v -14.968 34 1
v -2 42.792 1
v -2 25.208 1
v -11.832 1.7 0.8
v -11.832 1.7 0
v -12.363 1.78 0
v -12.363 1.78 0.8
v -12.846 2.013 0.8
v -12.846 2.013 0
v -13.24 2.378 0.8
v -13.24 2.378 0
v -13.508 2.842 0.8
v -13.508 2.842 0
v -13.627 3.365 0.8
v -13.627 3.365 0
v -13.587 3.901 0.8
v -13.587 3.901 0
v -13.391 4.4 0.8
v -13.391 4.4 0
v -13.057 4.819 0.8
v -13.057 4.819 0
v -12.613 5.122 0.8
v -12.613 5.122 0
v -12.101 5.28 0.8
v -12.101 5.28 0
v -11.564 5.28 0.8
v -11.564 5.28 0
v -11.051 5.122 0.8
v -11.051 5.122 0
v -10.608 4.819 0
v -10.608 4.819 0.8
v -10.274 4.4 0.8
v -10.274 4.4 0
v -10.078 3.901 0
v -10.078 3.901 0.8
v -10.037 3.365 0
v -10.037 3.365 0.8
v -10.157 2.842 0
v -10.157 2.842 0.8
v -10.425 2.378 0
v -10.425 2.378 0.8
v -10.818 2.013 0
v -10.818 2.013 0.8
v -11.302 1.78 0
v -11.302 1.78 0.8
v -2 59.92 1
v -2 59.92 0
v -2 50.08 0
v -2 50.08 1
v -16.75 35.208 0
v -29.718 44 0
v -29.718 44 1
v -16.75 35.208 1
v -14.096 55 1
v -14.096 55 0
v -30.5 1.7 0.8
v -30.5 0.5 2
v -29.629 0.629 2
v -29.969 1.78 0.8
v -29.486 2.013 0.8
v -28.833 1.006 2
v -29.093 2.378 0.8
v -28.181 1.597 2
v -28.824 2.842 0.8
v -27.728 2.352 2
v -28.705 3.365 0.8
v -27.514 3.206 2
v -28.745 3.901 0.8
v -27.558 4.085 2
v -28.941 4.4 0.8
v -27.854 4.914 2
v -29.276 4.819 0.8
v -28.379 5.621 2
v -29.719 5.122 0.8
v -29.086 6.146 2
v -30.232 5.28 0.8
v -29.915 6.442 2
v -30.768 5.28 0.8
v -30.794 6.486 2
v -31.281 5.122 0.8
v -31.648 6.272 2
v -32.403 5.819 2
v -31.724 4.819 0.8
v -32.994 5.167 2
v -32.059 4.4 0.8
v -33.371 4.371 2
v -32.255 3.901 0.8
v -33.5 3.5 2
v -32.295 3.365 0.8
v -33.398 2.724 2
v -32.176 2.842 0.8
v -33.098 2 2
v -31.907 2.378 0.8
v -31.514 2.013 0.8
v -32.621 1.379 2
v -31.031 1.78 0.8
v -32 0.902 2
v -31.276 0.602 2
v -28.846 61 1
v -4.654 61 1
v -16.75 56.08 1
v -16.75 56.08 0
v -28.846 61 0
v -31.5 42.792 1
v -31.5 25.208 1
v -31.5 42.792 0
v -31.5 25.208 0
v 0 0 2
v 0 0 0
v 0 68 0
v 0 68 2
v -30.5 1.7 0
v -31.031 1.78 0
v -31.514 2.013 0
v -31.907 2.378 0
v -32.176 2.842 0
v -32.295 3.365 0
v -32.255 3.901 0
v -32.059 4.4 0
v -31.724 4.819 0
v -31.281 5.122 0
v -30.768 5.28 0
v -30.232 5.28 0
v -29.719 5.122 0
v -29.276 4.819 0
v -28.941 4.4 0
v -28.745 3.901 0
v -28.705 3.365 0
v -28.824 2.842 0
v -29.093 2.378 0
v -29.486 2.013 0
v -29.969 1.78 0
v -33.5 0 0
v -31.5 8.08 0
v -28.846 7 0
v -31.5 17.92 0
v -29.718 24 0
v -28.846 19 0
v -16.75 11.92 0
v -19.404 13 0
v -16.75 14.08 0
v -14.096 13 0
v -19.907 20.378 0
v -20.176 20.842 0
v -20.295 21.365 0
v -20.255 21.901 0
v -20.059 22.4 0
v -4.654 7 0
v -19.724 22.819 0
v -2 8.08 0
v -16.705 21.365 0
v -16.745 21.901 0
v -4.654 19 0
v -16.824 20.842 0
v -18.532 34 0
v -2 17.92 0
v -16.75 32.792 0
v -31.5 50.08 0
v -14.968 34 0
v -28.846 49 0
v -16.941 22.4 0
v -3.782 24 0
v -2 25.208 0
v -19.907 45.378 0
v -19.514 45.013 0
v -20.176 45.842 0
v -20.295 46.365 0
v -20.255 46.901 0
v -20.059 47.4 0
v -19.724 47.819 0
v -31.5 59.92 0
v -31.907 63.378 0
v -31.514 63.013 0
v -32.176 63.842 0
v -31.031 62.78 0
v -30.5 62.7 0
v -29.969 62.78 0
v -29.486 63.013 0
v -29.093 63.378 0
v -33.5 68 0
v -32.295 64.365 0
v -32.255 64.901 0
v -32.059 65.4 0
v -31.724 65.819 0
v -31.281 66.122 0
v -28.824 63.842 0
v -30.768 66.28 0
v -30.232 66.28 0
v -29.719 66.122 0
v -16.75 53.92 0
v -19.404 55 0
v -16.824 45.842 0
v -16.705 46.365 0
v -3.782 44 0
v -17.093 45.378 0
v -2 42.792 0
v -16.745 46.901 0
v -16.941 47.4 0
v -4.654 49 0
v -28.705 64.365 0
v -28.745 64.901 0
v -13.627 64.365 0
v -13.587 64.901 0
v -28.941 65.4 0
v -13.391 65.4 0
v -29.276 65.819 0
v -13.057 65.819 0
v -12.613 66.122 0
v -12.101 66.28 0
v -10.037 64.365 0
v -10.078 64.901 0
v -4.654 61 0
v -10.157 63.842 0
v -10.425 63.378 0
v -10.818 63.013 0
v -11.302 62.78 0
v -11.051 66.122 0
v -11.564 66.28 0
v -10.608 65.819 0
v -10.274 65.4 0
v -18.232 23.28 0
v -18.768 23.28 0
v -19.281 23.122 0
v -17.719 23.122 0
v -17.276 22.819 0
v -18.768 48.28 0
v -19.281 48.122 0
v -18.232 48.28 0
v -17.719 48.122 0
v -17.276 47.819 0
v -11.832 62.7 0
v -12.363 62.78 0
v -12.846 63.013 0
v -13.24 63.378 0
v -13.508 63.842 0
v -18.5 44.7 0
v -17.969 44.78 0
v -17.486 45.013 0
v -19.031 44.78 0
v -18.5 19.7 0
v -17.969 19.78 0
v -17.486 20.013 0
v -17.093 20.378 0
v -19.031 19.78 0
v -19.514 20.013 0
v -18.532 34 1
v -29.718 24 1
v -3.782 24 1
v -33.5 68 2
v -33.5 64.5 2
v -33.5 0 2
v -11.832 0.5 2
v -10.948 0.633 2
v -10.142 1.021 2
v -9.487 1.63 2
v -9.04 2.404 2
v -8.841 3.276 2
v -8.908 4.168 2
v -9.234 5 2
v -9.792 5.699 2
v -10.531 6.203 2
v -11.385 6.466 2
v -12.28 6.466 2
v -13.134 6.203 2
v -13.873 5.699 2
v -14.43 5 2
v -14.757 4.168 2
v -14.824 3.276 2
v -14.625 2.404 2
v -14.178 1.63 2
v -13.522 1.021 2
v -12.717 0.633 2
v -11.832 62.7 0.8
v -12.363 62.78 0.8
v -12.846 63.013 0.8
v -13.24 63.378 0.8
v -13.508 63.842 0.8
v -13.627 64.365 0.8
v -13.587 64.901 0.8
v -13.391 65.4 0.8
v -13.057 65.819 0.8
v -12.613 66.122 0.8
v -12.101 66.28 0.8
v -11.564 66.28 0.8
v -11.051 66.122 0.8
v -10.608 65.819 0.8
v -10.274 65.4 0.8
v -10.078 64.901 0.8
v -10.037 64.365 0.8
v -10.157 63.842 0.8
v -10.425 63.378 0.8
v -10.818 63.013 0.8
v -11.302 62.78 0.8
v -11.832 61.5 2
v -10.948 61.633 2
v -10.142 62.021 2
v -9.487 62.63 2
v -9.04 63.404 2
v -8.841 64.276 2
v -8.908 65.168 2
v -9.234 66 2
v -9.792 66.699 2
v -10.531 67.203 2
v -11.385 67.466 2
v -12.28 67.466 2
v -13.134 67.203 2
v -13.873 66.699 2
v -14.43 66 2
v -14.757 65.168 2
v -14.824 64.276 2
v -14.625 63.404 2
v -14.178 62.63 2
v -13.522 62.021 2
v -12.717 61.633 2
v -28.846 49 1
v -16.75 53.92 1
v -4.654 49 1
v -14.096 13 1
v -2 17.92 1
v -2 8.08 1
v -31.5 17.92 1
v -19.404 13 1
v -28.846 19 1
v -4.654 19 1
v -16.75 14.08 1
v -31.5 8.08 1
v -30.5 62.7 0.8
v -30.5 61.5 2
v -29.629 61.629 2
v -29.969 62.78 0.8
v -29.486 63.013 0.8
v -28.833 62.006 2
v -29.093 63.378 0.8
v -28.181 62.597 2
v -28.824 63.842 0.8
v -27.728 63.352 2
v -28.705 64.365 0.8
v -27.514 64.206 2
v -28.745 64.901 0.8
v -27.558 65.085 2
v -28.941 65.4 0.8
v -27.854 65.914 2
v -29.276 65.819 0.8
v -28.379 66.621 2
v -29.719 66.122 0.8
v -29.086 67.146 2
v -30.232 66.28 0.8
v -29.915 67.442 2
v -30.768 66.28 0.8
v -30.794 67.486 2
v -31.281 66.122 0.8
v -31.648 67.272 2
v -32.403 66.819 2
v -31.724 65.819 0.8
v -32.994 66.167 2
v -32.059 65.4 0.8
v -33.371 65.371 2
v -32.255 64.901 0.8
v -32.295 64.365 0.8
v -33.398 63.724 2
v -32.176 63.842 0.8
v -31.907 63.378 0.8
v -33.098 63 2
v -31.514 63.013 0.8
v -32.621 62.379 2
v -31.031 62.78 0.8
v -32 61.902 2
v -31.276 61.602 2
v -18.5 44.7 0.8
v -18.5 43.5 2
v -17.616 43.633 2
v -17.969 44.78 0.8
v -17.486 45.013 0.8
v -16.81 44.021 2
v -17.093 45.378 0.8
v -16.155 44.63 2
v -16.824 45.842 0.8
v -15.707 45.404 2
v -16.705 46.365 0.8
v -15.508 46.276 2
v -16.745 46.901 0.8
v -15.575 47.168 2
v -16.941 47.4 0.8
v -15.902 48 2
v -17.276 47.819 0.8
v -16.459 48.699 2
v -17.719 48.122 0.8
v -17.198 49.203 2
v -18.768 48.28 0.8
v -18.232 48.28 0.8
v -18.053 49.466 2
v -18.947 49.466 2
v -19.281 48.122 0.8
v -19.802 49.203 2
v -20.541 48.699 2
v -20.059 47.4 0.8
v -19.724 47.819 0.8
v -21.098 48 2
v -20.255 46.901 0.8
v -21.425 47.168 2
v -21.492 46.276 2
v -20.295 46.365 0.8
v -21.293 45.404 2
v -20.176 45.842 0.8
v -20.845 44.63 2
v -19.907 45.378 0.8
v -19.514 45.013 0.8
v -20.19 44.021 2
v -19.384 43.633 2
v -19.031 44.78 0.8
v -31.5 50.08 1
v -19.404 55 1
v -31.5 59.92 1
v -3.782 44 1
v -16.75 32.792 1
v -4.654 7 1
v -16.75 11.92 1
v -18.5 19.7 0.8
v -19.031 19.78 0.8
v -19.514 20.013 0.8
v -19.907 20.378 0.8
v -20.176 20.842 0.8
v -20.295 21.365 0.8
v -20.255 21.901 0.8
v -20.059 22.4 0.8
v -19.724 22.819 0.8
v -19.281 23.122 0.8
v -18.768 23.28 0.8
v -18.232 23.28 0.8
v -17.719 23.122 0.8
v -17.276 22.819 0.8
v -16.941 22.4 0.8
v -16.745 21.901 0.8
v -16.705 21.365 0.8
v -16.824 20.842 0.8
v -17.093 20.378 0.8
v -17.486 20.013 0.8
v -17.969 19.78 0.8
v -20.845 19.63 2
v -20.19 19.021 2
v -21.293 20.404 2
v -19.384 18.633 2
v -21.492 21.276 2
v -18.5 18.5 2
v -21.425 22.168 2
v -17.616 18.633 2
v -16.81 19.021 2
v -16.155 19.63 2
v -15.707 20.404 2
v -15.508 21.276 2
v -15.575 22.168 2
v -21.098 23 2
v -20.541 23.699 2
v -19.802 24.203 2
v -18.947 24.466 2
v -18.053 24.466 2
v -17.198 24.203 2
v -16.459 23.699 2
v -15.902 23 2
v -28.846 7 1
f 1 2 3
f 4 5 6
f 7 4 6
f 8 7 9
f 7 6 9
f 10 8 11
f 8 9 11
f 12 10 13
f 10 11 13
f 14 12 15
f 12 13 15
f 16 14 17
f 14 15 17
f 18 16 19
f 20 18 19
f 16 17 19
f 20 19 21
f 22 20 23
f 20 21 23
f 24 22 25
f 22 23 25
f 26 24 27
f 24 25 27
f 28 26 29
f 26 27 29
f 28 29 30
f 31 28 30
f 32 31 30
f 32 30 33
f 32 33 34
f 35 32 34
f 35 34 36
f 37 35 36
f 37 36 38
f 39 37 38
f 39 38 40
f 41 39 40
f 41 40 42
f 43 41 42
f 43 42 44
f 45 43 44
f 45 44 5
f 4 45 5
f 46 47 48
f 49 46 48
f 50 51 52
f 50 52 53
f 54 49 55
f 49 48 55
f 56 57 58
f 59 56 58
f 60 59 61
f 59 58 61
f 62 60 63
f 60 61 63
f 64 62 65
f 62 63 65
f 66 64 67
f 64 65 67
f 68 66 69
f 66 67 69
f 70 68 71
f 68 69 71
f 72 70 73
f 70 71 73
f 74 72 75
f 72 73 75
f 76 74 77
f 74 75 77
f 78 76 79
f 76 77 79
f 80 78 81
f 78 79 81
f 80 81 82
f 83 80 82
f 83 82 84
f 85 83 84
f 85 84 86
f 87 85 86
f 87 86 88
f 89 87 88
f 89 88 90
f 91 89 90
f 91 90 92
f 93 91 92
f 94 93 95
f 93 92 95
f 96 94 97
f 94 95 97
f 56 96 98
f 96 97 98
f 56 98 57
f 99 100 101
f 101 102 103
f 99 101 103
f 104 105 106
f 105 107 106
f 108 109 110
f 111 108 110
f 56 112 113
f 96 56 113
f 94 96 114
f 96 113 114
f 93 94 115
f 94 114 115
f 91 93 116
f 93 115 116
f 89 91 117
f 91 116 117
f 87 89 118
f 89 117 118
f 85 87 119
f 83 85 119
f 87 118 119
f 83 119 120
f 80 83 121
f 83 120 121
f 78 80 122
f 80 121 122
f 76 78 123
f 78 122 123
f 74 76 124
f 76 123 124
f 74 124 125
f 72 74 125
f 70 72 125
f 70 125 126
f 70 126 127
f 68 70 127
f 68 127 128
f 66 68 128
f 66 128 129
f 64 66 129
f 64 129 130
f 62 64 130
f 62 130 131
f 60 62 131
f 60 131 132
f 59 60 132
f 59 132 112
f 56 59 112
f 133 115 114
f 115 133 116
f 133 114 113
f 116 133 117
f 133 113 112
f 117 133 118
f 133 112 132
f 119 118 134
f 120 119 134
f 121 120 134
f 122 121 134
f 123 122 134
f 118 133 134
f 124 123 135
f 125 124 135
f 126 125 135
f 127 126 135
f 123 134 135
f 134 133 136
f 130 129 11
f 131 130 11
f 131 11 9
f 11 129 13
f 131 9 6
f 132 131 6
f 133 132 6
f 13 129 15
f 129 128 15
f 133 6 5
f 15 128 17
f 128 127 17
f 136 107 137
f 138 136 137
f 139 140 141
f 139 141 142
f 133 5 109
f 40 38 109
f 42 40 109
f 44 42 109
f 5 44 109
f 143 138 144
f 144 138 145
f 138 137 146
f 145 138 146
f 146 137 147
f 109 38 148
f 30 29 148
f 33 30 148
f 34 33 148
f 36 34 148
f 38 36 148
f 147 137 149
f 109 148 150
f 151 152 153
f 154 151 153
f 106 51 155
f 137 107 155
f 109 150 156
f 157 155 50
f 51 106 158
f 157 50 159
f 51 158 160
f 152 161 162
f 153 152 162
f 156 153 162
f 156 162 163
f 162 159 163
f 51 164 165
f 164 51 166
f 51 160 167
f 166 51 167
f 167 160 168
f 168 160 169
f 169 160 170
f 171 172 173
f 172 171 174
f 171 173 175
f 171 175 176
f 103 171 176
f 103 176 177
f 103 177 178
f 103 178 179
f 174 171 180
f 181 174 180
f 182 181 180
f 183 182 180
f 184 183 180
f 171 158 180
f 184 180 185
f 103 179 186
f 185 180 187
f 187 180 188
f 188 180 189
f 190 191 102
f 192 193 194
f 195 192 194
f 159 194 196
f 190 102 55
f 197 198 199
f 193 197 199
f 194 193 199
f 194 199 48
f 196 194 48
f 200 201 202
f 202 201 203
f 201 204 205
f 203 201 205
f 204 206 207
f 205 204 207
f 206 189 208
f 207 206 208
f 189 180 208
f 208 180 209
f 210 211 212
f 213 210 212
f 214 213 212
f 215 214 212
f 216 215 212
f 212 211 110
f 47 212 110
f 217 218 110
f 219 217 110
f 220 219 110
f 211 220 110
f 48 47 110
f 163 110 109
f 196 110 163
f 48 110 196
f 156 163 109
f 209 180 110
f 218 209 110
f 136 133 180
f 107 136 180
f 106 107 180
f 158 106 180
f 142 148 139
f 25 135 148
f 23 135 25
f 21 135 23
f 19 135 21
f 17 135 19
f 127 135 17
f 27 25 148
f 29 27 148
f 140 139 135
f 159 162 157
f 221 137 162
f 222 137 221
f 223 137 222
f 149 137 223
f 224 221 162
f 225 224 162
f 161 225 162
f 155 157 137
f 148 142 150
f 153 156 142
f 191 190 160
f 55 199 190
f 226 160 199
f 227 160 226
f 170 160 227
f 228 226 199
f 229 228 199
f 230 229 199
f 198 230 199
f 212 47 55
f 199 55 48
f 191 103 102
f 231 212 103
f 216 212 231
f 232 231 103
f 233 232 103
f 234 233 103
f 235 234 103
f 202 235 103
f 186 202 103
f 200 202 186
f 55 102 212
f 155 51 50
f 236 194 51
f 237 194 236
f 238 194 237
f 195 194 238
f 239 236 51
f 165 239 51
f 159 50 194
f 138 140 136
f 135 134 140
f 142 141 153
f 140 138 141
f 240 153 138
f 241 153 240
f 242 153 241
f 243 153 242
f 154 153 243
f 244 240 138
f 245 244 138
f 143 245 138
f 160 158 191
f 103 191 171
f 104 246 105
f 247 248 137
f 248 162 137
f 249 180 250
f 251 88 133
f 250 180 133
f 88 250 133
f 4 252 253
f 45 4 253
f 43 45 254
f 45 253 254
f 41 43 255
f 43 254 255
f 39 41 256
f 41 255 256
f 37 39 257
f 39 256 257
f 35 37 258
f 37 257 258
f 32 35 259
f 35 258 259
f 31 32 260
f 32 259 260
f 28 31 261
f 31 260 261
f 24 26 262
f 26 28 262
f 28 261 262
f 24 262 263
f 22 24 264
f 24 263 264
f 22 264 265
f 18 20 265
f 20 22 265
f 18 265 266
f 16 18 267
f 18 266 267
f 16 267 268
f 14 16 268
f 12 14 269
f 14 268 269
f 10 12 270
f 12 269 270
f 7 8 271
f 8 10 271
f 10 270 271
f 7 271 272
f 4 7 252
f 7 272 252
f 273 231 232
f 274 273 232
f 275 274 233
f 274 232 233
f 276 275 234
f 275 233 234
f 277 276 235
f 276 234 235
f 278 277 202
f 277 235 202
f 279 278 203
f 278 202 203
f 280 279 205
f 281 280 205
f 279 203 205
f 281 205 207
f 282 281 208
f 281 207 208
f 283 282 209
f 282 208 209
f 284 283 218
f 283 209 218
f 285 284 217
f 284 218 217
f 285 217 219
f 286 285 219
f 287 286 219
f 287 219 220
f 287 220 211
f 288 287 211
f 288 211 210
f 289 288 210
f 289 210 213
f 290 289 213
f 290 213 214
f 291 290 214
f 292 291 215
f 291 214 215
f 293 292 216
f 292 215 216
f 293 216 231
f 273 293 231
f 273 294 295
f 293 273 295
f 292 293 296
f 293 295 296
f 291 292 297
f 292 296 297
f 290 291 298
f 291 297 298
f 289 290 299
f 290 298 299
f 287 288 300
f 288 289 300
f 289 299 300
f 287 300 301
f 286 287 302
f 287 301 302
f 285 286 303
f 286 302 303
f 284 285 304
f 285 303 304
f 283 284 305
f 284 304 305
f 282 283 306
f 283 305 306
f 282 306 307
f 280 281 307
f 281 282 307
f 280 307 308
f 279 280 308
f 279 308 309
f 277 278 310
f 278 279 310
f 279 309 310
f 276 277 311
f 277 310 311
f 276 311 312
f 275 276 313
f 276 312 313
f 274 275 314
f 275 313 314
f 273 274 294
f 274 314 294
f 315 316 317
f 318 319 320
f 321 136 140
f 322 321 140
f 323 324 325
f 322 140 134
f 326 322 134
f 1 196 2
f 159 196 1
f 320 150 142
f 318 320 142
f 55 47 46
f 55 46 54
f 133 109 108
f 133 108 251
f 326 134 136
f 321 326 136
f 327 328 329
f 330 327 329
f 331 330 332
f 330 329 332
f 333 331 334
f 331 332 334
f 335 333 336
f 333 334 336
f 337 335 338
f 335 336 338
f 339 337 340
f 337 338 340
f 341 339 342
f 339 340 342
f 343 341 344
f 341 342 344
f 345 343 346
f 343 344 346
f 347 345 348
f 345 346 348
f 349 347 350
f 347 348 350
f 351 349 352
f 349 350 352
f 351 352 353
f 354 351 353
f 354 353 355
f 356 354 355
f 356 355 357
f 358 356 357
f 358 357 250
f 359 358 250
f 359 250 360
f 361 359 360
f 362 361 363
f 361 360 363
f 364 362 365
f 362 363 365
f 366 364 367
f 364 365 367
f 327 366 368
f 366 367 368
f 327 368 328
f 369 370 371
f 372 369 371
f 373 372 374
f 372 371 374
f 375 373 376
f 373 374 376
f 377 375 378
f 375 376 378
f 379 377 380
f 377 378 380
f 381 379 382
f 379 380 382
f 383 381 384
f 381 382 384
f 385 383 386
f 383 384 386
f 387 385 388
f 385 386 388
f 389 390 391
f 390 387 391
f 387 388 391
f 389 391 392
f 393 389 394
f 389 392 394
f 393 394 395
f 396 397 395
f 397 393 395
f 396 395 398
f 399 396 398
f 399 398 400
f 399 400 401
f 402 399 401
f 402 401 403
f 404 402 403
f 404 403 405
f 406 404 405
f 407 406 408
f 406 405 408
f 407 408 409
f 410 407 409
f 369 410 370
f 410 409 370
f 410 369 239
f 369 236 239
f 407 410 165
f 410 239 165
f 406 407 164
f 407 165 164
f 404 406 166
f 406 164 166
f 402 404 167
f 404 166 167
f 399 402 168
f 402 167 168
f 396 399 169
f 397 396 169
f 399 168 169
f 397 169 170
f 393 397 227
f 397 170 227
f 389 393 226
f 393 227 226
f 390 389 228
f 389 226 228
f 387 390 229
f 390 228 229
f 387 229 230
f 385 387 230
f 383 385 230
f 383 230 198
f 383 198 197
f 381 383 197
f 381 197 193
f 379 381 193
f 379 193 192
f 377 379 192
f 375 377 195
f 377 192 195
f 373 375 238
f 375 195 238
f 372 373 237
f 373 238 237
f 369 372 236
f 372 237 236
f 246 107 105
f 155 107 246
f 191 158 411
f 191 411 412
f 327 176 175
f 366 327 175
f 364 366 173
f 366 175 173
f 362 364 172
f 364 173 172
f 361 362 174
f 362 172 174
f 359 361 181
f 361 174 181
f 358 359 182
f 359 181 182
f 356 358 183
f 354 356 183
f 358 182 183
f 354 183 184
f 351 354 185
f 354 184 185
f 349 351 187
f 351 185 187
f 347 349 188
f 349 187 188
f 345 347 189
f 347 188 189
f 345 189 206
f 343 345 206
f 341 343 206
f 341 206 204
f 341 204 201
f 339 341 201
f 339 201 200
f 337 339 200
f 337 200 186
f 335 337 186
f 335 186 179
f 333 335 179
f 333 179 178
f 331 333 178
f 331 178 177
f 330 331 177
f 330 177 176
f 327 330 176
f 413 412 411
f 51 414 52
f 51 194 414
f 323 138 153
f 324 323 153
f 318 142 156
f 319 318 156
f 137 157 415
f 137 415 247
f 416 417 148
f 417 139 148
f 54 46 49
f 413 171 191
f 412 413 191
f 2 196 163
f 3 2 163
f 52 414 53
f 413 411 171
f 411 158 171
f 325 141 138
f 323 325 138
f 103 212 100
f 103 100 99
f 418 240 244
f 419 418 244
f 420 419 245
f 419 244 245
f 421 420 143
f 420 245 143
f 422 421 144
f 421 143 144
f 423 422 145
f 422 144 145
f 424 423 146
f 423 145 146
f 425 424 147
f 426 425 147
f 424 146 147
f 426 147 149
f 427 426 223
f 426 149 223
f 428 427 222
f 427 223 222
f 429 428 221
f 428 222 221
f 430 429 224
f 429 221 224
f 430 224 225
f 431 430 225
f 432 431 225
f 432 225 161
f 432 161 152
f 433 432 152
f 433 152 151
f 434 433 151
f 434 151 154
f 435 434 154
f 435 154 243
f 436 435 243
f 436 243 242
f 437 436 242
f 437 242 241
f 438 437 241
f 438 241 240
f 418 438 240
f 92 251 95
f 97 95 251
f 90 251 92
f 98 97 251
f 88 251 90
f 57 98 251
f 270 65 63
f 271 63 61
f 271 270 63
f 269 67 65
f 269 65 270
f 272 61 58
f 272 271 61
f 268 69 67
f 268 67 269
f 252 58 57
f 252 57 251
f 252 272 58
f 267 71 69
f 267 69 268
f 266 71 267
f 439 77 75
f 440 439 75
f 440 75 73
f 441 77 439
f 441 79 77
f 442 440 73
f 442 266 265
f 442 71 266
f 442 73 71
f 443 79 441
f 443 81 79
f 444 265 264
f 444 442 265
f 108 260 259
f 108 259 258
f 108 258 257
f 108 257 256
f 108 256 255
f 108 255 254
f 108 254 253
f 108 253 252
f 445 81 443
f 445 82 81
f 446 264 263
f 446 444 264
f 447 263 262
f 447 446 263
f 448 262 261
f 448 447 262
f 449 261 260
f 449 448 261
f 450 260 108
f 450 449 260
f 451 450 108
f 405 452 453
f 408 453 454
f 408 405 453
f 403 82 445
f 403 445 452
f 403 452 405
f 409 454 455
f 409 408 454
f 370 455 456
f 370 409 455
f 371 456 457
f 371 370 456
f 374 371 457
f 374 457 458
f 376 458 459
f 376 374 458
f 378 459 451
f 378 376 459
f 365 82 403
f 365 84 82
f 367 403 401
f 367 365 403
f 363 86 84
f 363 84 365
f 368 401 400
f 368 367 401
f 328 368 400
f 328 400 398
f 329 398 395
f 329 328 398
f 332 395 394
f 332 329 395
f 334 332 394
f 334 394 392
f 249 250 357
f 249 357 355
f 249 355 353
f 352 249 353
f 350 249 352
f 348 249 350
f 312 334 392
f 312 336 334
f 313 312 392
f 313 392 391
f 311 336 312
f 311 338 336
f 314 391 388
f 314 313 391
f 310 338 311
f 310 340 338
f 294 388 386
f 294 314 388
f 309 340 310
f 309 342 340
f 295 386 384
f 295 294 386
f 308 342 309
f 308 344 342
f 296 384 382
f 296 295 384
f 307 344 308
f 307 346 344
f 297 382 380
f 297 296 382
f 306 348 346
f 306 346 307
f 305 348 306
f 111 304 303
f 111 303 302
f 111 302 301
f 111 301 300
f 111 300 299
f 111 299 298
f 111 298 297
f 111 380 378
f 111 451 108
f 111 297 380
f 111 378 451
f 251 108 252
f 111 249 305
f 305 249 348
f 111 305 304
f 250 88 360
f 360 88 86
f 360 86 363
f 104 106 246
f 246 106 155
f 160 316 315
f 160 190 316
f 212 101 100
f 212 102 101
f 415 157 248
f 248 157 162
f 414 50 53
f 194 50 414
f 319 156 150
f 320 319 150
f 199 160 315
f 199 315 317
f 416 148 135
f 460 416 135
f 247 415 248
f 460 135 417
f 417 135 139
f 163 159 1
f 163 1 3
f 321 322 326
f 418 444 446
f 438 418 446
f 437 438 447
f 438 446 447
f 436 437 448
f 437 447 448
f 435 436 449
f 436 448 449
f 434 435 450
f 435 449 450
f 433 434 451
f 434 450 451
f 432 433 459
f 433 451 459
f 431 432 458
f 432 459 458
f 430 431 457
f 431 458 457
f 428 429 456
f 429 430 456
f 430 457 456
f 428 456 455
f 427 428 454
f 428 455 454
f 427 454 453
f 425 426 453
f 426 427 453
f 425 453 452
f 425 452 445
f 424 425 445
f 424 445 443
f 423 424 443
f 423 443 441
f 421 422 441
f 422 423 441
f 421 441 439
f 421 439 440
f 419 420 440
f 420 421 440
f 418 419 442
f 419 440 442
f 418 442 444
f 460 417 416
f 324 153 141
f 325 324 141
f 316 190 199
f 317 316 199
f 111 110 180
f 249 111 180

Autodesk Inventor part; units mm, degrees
ref_plane "YZ Plane" through (0, 0, 0) normal (1, 0, 0) x (0, 1, 0)
ref_plane "XZ Plane" through (0, 0, 0) normal (0, 1, 0) x (-1, 0, 0)
ref_plane "Work Plane1" through (0, 0, 0) normal (0, 0, 1) x (1, 0, 0)
sketch "Sketch1" plane through (0, 0, 0) normal (0, 0, 1) x (1, 0, 0)
  line L0 (0, 0) -> (0, 68) projected
  line L1 (-3.5, 0) -> (-3.5, 68) projected
  line L2 (0, 0) -> (-3.5, 0) projected
  line L3 (-3.5, 7) -> (-3.5, 0) projected
  line L4 (-3.5, 7) -> (-33.5, 7) projected
  line L5 (-33.5, 7) -> (-33.5, 0) projected
  line L6 (-6.5, 0) -> (-33.5, 0) projected
  line L7 (-3.5, 0) -> (-6.5, 0) projected
  line L8 (-33.5, 19) -> (-33.5, 24) projected
  line L9 (-33.5, 19) -> (-3.5, 19) projected
  line L10 (-3.5, 19) -> (-3.5, 24) projected
  line L11 (-3.5, 24) -> (-33.5, 24) projected
  line L12 (-33.5, 49) -> (-33.5, 44) projected
  line L13 (-3.5, 44) -> (-33.5, 44) projected
  line L14 (-3.5, 49) -> (-3.5, 44) projected
  line L15 (-33.5, 49) -> (-3.5, 49) projected
  line L16 (-3.5, 61) -> (-3.5, 68) projected
  line L17 (-3.5, 68) -> (-6.5, 68) projected
  line L18 (-6.5, 68) -> (-33.5, 68) projected
  line L19 (-33.5, 61) -> (-33.5, 68) projected
  line L20 (-3.5, 61) -> (-33.5, 61) projected
  line L21 (-34.5, 123) -> (10.5, 123) projected
  line L22 (10.5, -55) -> (-34.5, -55) projected
  line L23 (-33.5, 123) -> (-33.5, -55.3182)
  circle A0 centre (-30.5, 64.5) radius 2.3 projected
  circle A1 centre (-11.8324, 64.5) radius 2.3 projected
  circle A2 centre (-18.5, 21.5) radius 2.3 projected
  circle A3 centre (-18.5, 46.5) radius 2.3 projected
  line L24 (0, -55) -> (0, 123)
  line L25 (0, 68) -> (-3.5, 68) projected
  point P0 (-33.5, -55)
  dimension "d10" = 0
  dimension "d41" = 0
extrude "Extrusion1" add sketch "Sketch1" along normal blind 2 contours L2 L1 L25 L0 | L7 L6 L5 L4 L1 | L1 L20 L19 L18 L17 | L4 L23 L9 L1 | L1 L15 L23 L20 | L9 L8 L11 L1 | L1 L13 L12 L15 | L11 L23 L13 L1 | A0 | A1 | A2 | A3
sketch "Sketch2" plane through (0, 0, 2) normal (0, 0, 1) x (1, 0, 0)
  circle A0 centre (-30.5, 3.5) radius 2.3 projected
  circle A1 centre (-11.8324, 3.5) radius 2.3 projected
  line L0 (-3.5, 7) -> (-3.5, 0) projected
  line L1 (-3.5, 7) -> (-33.5, 7) projected
  line L2 (-33.5, 7) -> (-33.5, 0) projected
  line L3 (-6.5, 0) -> (-33.5, 0) projected
  line L4 (-3.5, 0) -> (-6.5, 0) projected
  circle A2 centre (-18.5, 46.5) radius 2.3 projected
  line L5 (-33.5, 49) -> (-33.5, 44) projected
  line L6 (-3.5, 44) -> (-33.5, 44) projected
  line L7 (-3.5, 49) -> (-3.5, 44) projected
  line L8 (-33.5, 49) -> (-3.5, 49) projected
  circle A3 centre (-18.5, 21.5) radius 2.3 projected
  line L9 (-33.5, 19) -> (-33.5, 24) projected
  line L10 (-33.5, 19) -> (-3.5, 19) projected
  line L11 (-3.5, 19) -> (-3.5, 24) projected
  line L12 (-3.5, 24) -> (-33.5, 24) projected
  circle A4 centre (-30.5, 64.5) radius 2.3 projected
  circle A5 centre (-11.8324, 64.5) radius 2.3 projected
  line L13 (-3.5, 61) -> (-3.5, 68) projected
  line L14 (-3.5, 68) -> (-6.5, 68) projected
  line L15 (-6.5, 68) -> (-33.5, 68) projected
  line L16 (-33.5, 61) -> (-33.5, 68) projected
  line L17 (-3.5, 61) -> (-33.5, 61) projected
  point P0 (0, 0)
hole "Hole1" at (-30.5, 3.5, 2) at (-11.8324, 3.5, 2) at (-18.5, 21.5, 2) at (-18.5, 46.5, 2) at (-30.5, 64.5, 2) at (-11.8324, 64.5, 2) direction (0, 0, -1) diameter 3.6 end through all countersink diameter 6 countersink angle 90 clearance for "Countersunk Flat Head Screw ISO 2009/7046" size "M3" standard "ISO"
sketch "Sketch3" plane through (0, 0, 0) normal (0, 0, -1) x (-1, 0, 0)
  circle A0 centre (30.5, 3.5) radius 2.3 projected
  circle A1 centre (11.8324, 3.5) radius 2.3 projected
  line L0 (3.5, 7) -> (3.5, 0) projected
  line L1 (3.5, 7) -> (33.5, 7) projected
  line L2 (33.5, 7) -> (33.5, 0) projected
  line L3 (6.5, 0) -> (33.5, 0) projected
  line L4 (3.5, 0) -> (6.5, 0) projected
  circle A2 centre (18.5, 21.5) radius 2.3 projected
  line L5 (33.5, 19) -> (33.5, 24) projected
  line L6 (33.5, 19) -> (3.5, 19) projected
  line L7 (3.5, 19) -> (3.5, 24) projected
  line L8 (3.5, 24) -> (33.5, 24) projected
  circle A3 centre (18.5, 46.5) radius 2.3 projected
  line L9 (33.5, 49) -> (33.5, 44) projected
  line L10 (3.5, 44) -> (33.5, 44) projected
  line L11 (3.5, 49) -> (3.5, 44) projected
  line L12 (33.5, 49) -> (3.5, 49) projected
  circle A4 centre (30.5, 64.5) radius 2.3 projected
  circle A5 centre (11.8324, 64.5) radius 2.3 projected
  line L13 (3.5, 61) -> (3.5, 68) projected
  line L14 (3.5, 68) -> (6.5, 68) projected
  line L15 (6.5, 68) -> (33.5, 68) projected
  line L16 (33.5, 61) -> (33.5, 68) projected
  line L17 (3.5, 61) -> (33.5, 61) projected
  line L18 (33.5, 123) -> (33.5, -55)
  line L19 (33.5, 68) -> (0, 68)
  line L20 (0, 68) -> (0, 0)
  line L21 (0, 0) -> (33.5, 0)
  line L22 (33.5, 0) -> (33.5, 68)
  line L23 (31.5, 68) -> (2, 68)
  line L24 (2, 68) -> (2, 121)
  line L25 (2, 121) -> (31.5, 121)
  line L26 (31.5, 121) -> (31.5, 68)
  line L27 (31.5, 0) -> (2, 0)
  line L28 (2, 0) -> (2, -53)
  line L29 (2, -53) -> (31.5, -53)
  line L30 (31.5, -53) -> (31.5, 0)
  line L31 (0, 123) -> (33.5, 123) projected
  line L32 (0, -55) -> (0, 123)
  line L33 (33.5, -55) -> (0, -55) projected
  line L34 (2, 68) -> (31.5, 121) construction
  line L35 (31.5, 68) -> (2, 121) construction
  line L36 (31.5, 0) -> (2, -53) construction
  line L37 (31.5, -53) -> (2, 0) construction
  line L38 (3.1445, 121) -> (31.5, 70.0562)
  line L39 (2, 118.9438) -> (30.3555, 68)
  line L40 (3.1445, 68) -> (31.5, 118.9438)
  line L41 (30.3555, 121) -> (2, 70.0562)
  line L42 (3.1445, 0) -> (31.5, -50.9438)
  line L43 (30.3555, -53) -> (2, -2.0562)
  line L44 (2, -50.9438) -> (30.3555, 0)
  line L45 (31.5, -2.0562) -> (3.1445, -53)
  line L46 (31.5, 61) -> (2, 61)
  line L47 (2, 61) -> (2, 49)
  line L48 (2, 49) -> (31.5, 49)
  line L49 (31.5, 49) -> (31.5, 61)
  line L50 (31.5, 44) -> (2, 44)
  line L51 (2, 44) -> (2, 24)
  line L52 (2, 24) -> (31.5, 24)
  line L53 (31.5, 24) -> (31.5, 44)
  line L54 (31.5, 19) -> (2, 19)
  line L55 (2, 19) -> (2, 7)
  line L56 (2, 7) -> (31.5, 7)
  line L57 (31.5, 7) -> (31.5, 19)
  line L58 (31.5, 61) -> (2, 49) construction
  line L59 (31.5, 49) -> (2, 61) construction
  line L60 (2, 44) -> (31.5, 24) construction
  line L61 (31.5, 44) -> (2, 24) construction
  line L62 (2, 19) -> (31.5, 7) construction
  line L63 (31.5, 19) -> (2, 7) construction
  line L64 (2, 50.0796) -> (28.8461, 61)
  line L65 (31.5, 59.9204) -> (4.6539, 49)
  line L66 (31.5, 50.0796) -> (4.6539, 61)
  line L67 (2, 59.9204) -> (28.8461, 49)
  line L68 (29.718, 44) -> (2, 25.2082)
  line L69 (31.5, 42.7918) -> (3.782, 24)
  line L70 (2, 42.7918) -> (29.718, 24)
  line L71 (31.5, 25.2082) -> (3.782, 44)
  line L72 (31.5, 17.9204) -> (4.6539, 7)
  line L73 (2, 8.0796) -> (28.8461, 19)
  line L74 (4.6539, 19) -> (31.5, 8.0796)
  line L75 (28.8461, 7) -> (2, 17.9204)
  line L76 (33.5, 68) -> (33.5, 0) projected
  line L77 (33.5, 3.5) -> (33.5, 0) projected
  line L78 (33.5, 64.5) -> (33.5, 3.5) projected
  line L79 (33.5, 68) -> (33.5, 64.5) projected
  point P0 (16.75, -24.4438)
  point P1 (30.3555, 0)
  point P2 (3.1445, 0)
  point P3 (17.8945, -26.5)
  point P4 (16.75, -28.5562)
  point P5 (15.6055, -26.5)
  point P6 (16.75, 92.4438)
  point P7 (30.3555, 68)
  point P8 (15.6055, 94.5)
  point P9 (17.8945, 94.5)
  point P10 (16.75, 96.5562)
  point P11 (19.4039, 13)
  point P12 (28.8461, 7)
  point P13 (16.75, 11.9204)
  point P14 (4.6539, 7)
  point P15 (14.0961, 13)
  point P16 (16.75, 14.0796)
  point P17 (28.8461, 19)
  point P18 (29.718, 24)
  point P19 (16.75, 32.7918)
  point P20 (3.782, 24)
  point P21 (18.532, 34)
  point P22 (14.968, 34)
  point P23 (3.782, 44)
  point P24 (16.75, 35.2082)
  point P25 (14.0961, 55)
  point P26 (4.6539, 49)
  point P27 (16.75, 56.0796)
  point P28 (28.8461, 61)
  point P29 (19.4039, 55)
  point P30 (16.75, 53.9204)
  dimension "d11" = 2
  dimension "d12" = 2
  dimension "d13" = 2
  dimension "d14" = 2
  dimension "d15" = 2
  dimension "d16" = 2
  dimension "d17" = 1
  dimension "d18" = 1
  dimension "d19" = 1
  dimension "d20" = 1
  dimension "d21" = 1
  dimension "d22" = 1
  dimension "d23" = 1
  dimension "d24" = 1
  dimension "d27" = 2
  dimension "d28" = 2
  dimension "d29" = 1
  dimension "d30" = 1
  dimension "d31" = 1
  dimension "d32" = 1
  dimension "d33" = 1
  dimension "d34" = 1
  dimension "d35" = 1
  dimension "d36" = 1
  dimension "d37" = 1
  dimension "d38" = 1
  dimension "d39" = 1
  dimension "d40" = 1
  dimension "d42" = 0
extrude "Extrusion2" cut sketch "Sketch3" against normal blind 1 contours L4 L3 L44 L42 L21 | L72 L75 L1 | L55 L75 L73 | L72 L57 L74 | L43 L44 L28 | L45 L30 L42 | L74 L6 L73 | L43 L29 L45 | L40 L39 L15 L14 L19 | L24 L39 L41 | L69 L70 L8 | L71 L69 L53 | L51 L70 L68 | L40 L26 L38 | L38 L25 L41 | L68 L71 L10 | L17 L64 L66 | L12 L65 L67 | L66 L65 L49 | L67 L64 L47
properties part number "back" material "ABS Plastic"
